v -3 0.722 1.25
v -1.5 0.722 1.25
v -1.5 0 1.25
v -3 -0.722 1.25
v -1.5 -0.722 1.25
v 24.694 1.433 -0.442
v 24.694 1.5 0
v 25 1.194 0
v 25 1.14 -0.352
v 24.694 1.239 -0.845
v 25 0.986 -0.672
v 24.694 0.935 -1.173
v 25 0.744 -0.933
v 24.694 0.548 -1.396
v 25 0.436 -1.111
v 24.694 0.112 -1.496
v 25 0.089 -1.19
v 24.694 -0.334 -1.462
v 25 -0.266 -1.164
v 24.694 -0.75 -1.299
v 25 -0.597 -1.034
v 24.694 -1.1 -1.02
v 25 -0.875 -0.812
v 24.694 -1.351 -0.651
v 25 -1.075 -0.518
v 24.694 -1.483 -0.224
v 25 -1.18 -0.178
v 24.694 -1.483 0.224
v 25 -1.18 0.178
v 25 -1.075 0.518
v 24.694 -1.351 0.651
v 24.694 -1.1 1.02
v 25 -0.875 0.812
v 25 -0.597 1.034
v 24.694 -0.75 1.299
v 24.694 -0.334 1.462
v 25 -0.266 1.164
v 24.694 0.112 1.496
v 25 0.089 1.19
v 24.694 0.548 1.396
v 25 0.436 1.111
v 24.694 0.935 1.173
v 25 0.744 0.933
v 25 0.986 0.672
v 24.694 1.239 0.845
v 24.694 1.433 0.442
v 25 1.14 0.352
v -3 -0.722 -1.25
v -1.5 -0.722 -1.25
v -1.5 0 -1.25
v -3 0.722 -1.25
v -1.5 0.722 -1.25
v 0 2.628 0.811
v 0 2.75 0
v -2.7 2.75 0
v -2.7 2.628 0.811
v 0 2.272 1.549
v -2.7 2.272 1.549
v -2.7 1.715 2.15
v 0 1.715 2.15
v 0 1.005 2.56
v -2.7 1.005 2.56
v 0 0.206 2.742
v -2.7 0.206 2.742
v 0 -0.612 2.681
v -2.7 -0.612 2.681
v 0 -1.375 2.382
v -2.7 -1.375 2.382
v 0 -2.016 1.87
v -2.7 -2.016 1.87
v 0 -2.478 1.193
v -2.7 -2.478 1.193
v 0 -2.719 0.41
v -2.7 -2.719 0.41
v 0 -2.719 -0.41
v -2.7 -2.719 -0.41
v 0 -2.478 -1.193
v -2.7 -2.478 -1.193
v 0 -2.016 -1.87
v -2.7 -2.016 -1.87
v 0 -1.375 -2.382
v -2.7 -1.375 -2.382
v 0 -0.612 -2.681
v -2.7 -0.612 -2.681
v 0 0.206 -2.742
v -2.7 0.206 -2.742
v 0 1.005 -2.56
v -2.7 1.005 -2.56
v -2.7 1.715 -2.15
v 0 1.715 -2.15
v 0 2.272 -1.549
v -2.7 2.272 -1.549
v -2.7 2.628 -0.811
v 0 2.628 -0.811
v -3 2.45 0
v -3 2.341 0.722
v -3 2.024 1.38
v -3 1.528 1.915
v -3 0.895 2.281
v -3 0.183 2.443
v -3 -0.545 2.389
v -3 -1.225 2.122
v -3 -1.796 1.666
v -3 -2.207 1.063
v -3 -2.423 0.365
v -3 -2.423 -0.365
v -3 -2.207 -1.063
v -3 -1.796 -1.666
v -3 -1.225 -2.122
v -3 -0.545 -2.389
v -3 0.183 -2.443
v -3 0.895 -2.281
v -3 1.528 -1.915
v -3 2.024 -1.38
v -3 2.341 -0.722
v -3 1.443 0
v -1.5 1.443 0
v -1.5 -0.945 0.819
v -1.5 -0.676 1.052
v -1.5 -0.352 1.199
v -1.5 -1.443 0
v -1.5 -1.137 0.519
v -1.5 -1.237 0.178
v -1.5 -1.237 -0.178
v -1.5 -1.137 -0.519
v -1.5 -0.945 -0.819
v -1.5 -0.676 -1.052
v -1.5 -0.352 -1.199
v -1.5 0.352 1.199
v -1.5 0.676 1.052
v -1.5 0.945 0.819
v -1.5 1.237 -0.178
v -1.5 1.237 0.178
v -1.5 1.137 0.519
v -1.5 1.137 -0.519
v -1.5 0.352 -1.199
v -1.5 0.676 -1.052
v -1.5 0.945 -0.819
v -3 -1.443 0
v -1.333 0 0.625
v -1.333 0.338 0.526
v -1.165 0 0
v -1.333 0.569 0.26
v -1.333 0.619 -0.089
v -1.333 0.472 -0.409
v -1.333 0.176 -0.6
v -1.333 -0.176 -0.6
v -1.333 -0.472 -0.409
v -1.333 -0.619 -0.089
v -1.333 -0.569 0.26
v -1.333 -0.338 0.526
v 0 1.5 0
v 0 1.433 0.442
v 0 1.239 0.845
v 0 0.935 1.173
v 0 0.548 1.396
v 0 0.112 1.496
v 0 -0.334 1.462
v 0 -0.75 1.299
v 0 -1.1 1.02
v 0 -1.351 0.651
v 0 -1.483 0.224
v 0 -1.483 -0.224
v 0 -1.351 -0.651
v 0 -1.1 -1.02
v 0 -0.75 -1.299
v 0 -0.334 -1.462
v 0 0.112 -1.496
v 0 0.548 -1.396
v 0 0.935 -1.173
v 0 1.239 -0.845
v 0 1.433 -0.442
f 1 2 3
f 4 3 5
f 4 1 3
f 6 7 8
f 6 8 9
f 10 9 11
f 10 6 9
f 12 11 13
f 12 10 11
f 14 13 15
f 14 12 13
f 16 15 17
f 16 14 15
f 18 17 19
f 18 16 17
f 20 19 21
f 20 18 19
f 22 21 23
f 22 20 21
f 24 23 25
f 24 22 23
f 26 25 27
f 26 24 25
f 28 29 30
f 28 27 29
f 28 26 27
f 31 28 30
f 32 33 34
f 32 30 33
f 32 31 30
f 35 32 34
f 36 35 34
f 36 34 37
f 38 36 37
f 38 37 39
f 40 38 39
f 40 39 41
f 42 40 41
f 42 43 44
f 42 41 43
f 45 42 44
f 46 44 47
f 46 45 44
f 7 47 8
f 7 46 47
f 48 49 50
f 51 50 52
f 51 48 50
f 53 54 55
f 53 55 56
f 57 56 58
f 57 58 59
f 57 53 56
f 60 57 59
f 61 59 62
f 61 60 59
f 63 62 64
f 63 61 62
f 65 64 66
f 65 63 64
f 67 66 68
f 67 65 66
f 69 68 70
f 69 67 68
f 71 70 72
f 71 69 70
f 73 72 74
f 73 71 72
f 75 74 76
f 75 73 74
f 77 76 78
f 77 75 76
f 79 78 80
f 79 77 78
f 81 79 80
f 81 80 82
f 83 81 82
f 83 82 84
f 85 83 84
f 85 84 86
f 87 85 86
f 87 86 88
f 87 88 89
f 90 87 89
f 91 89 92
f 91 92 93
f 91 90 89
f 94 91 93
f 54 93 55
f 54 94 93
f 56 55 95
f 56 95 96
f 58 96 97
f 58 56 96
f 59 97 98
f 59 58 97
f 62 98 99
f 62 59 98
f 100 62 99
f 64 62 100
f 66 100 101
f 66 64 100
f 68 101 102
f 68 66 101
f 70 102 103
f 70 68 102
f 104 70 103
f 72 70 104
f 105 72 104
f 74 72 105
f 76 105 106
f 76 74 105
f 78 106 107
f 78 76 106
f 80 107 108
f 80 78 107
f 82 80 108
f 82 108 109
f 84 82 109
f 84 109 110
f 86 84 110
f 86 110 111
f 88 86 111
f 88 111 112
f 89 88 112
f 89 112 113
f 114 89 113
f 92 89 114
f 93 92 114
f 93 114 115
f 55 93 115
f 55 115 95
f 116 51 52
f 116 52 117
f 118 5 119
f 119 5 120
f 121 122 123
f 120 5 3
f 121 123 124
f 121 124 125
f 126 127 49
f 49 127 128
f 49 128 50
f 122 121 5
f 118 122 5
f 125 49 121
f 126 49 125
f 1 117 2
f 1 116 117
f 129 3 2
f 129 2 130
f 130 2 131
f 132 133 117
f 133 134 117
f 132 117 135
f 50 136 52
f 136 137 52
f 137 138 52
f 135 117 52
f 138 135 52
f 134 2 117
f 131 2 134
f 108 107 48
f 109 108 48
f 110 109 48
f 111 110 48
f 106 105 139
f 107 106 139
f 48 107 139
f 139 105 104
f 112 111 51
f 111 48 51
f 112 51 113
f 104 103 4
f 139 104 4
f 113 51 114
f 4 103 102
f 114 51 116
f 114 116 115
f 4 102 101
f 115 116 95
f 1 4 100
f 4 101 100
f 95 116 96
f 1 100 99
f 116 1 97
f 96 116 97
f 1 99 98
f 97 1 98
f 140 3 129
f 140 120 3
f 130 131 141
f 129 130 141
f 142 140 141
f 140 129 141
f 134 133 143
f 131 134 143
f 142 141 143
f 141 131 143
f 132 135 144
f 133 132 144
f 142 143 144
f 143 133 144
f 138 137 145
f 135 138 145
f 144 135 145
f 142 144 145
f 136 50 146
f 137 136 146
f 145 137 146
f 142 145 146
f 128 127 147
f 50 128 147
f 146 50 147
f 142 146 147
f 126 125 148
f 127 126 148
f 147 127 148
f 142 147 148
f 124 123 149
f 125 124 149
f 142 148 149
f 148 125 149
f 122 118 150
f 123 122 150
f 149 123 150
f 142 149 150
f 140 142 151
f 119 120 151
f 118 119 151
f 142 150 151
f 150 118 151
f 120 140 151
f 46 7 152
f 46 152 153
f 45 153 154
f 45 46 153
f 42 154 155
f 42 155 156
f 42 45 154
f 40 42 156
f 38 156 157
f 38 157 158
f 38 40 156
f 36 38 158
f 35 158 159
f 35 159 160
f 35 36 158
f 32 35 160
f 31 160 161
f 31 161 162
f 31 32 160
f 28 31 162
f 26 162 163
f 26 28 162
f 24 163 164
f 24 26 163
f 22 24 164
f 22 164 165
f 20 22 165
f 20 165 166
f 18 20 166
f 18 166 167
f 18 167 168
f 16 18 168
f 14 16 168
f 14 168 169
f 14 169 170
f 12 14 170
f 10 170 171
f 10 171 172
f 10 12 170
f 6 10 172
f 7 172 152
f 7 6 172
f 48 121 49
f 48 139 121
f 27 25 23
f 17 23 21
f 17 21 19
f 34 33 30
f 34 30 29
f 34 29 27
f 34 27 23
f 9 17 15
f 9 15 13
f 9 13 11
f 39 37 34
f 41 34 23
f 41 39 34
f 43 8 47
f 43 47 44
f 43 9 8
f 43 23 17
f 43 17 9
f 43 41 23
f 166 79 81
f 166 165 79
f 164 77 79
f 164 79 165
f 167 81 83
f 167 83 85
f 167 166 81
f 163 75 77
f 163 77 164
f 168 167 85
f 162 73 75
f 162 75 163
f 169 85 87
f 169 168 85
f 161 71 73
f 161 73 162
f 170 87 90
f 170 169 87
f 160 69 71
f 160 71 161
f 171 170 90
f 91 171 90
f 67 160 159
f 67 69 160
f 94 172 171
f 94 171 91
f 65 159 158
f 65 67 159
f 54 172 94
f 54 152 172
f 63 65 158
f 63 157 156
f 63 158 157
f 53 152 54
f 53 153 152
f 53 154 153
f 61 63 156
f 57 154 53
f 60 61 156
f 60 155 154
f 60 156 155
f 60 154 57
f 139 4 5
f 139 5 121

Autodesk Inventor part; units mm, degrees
sketch "Sketch_2" plane through (0, 0, 0) normal (0, 0, 1) x (1, 0, 0)
  line L0 (25, 0) -> (-3, 0)
  line L1 (-3, 0) -> (-3, 2.45)
  line L2 (-3, 2.45) -> (-2.7, 2.75)
  line L3 (-2.7, 2.75) -> (0, 2.75)
  line L4 (0, 2.75) -> (0, 1.5)
  line L5 (0, 1.5) -> (24.6935, 1.5)
  line L6 (24.6935, 1.5) -> (25, 1.1935)
  line L7 (25, 1.1935) -> (25, 0)
  line L8 (25, 0) -> (-3, 0)
revolve "Revolution1" add sketch "Sketch_2" angle 360 about axis through (25, 0, 0) along (1, 0, 0)
thread "Thread1" size "M3x0.5" class "6g" standard "ISO Metric profile" length 17.6935
sketch "Sketch2" plane through (-3, 0, 0) normal (-1, 0, 0) x (0, 0, 1)
  point P0 (0, 0)
hole "Hole1" at (-3, 0, 0) direction (1, 0, 0) diameter 2.5 depth 1.5 tip angle 150
sketch "Sketch_3" plane through (-3, 0, 0) normal (1, 0, 0) x (0, 0, -1)
  line L0 (-1.25, -0.7217) -> (0, -1.4434)
  line L1 (0, -1.4434) -> (1.25, -0.7217)
  line L2 (1.25, -0.7217) -> (1.25, 0.7217)
  line L3 (1.25, 0.7217) -> (0, 1.4434)
  line L4 (0, 1.4434) -> (-1.25, 0.7217)
  line L5 (-1.25, 0.7217) -> (-1.25, -0.7217)
extrude "Extrusion1" cut sketch "Sketch_3" along normal blind 1.5
ref_plane "bolt_to_nut_XY" through (25, 0, 0) normal (1, 0, 0) x (0, 0, -1)
ref_plane "bolt_to_nut_YZ" through (25, 0, 0) normal (0, 0, -1) x (0, 1, 0)
ref_plane "bolt_to_nut_ZX" through (25, 0, 0) normal (0, 1, 0) x (1, 0, 0)
ref_plane "screw1_XY" through (0, 0, 0) normal (1, 0, 0) x (0, 0, -1)
ref_plane "screw1_YZ" through (0, 0, 0) normal (0, 0, -1) x (0, 1, 0)
ref_plane "screw1_ZX" through (0, 0, 0) normal (0, 1, 0) x (1, 0, 0)
properties part number "CB3-25" material "鋼、炭素鋼"
